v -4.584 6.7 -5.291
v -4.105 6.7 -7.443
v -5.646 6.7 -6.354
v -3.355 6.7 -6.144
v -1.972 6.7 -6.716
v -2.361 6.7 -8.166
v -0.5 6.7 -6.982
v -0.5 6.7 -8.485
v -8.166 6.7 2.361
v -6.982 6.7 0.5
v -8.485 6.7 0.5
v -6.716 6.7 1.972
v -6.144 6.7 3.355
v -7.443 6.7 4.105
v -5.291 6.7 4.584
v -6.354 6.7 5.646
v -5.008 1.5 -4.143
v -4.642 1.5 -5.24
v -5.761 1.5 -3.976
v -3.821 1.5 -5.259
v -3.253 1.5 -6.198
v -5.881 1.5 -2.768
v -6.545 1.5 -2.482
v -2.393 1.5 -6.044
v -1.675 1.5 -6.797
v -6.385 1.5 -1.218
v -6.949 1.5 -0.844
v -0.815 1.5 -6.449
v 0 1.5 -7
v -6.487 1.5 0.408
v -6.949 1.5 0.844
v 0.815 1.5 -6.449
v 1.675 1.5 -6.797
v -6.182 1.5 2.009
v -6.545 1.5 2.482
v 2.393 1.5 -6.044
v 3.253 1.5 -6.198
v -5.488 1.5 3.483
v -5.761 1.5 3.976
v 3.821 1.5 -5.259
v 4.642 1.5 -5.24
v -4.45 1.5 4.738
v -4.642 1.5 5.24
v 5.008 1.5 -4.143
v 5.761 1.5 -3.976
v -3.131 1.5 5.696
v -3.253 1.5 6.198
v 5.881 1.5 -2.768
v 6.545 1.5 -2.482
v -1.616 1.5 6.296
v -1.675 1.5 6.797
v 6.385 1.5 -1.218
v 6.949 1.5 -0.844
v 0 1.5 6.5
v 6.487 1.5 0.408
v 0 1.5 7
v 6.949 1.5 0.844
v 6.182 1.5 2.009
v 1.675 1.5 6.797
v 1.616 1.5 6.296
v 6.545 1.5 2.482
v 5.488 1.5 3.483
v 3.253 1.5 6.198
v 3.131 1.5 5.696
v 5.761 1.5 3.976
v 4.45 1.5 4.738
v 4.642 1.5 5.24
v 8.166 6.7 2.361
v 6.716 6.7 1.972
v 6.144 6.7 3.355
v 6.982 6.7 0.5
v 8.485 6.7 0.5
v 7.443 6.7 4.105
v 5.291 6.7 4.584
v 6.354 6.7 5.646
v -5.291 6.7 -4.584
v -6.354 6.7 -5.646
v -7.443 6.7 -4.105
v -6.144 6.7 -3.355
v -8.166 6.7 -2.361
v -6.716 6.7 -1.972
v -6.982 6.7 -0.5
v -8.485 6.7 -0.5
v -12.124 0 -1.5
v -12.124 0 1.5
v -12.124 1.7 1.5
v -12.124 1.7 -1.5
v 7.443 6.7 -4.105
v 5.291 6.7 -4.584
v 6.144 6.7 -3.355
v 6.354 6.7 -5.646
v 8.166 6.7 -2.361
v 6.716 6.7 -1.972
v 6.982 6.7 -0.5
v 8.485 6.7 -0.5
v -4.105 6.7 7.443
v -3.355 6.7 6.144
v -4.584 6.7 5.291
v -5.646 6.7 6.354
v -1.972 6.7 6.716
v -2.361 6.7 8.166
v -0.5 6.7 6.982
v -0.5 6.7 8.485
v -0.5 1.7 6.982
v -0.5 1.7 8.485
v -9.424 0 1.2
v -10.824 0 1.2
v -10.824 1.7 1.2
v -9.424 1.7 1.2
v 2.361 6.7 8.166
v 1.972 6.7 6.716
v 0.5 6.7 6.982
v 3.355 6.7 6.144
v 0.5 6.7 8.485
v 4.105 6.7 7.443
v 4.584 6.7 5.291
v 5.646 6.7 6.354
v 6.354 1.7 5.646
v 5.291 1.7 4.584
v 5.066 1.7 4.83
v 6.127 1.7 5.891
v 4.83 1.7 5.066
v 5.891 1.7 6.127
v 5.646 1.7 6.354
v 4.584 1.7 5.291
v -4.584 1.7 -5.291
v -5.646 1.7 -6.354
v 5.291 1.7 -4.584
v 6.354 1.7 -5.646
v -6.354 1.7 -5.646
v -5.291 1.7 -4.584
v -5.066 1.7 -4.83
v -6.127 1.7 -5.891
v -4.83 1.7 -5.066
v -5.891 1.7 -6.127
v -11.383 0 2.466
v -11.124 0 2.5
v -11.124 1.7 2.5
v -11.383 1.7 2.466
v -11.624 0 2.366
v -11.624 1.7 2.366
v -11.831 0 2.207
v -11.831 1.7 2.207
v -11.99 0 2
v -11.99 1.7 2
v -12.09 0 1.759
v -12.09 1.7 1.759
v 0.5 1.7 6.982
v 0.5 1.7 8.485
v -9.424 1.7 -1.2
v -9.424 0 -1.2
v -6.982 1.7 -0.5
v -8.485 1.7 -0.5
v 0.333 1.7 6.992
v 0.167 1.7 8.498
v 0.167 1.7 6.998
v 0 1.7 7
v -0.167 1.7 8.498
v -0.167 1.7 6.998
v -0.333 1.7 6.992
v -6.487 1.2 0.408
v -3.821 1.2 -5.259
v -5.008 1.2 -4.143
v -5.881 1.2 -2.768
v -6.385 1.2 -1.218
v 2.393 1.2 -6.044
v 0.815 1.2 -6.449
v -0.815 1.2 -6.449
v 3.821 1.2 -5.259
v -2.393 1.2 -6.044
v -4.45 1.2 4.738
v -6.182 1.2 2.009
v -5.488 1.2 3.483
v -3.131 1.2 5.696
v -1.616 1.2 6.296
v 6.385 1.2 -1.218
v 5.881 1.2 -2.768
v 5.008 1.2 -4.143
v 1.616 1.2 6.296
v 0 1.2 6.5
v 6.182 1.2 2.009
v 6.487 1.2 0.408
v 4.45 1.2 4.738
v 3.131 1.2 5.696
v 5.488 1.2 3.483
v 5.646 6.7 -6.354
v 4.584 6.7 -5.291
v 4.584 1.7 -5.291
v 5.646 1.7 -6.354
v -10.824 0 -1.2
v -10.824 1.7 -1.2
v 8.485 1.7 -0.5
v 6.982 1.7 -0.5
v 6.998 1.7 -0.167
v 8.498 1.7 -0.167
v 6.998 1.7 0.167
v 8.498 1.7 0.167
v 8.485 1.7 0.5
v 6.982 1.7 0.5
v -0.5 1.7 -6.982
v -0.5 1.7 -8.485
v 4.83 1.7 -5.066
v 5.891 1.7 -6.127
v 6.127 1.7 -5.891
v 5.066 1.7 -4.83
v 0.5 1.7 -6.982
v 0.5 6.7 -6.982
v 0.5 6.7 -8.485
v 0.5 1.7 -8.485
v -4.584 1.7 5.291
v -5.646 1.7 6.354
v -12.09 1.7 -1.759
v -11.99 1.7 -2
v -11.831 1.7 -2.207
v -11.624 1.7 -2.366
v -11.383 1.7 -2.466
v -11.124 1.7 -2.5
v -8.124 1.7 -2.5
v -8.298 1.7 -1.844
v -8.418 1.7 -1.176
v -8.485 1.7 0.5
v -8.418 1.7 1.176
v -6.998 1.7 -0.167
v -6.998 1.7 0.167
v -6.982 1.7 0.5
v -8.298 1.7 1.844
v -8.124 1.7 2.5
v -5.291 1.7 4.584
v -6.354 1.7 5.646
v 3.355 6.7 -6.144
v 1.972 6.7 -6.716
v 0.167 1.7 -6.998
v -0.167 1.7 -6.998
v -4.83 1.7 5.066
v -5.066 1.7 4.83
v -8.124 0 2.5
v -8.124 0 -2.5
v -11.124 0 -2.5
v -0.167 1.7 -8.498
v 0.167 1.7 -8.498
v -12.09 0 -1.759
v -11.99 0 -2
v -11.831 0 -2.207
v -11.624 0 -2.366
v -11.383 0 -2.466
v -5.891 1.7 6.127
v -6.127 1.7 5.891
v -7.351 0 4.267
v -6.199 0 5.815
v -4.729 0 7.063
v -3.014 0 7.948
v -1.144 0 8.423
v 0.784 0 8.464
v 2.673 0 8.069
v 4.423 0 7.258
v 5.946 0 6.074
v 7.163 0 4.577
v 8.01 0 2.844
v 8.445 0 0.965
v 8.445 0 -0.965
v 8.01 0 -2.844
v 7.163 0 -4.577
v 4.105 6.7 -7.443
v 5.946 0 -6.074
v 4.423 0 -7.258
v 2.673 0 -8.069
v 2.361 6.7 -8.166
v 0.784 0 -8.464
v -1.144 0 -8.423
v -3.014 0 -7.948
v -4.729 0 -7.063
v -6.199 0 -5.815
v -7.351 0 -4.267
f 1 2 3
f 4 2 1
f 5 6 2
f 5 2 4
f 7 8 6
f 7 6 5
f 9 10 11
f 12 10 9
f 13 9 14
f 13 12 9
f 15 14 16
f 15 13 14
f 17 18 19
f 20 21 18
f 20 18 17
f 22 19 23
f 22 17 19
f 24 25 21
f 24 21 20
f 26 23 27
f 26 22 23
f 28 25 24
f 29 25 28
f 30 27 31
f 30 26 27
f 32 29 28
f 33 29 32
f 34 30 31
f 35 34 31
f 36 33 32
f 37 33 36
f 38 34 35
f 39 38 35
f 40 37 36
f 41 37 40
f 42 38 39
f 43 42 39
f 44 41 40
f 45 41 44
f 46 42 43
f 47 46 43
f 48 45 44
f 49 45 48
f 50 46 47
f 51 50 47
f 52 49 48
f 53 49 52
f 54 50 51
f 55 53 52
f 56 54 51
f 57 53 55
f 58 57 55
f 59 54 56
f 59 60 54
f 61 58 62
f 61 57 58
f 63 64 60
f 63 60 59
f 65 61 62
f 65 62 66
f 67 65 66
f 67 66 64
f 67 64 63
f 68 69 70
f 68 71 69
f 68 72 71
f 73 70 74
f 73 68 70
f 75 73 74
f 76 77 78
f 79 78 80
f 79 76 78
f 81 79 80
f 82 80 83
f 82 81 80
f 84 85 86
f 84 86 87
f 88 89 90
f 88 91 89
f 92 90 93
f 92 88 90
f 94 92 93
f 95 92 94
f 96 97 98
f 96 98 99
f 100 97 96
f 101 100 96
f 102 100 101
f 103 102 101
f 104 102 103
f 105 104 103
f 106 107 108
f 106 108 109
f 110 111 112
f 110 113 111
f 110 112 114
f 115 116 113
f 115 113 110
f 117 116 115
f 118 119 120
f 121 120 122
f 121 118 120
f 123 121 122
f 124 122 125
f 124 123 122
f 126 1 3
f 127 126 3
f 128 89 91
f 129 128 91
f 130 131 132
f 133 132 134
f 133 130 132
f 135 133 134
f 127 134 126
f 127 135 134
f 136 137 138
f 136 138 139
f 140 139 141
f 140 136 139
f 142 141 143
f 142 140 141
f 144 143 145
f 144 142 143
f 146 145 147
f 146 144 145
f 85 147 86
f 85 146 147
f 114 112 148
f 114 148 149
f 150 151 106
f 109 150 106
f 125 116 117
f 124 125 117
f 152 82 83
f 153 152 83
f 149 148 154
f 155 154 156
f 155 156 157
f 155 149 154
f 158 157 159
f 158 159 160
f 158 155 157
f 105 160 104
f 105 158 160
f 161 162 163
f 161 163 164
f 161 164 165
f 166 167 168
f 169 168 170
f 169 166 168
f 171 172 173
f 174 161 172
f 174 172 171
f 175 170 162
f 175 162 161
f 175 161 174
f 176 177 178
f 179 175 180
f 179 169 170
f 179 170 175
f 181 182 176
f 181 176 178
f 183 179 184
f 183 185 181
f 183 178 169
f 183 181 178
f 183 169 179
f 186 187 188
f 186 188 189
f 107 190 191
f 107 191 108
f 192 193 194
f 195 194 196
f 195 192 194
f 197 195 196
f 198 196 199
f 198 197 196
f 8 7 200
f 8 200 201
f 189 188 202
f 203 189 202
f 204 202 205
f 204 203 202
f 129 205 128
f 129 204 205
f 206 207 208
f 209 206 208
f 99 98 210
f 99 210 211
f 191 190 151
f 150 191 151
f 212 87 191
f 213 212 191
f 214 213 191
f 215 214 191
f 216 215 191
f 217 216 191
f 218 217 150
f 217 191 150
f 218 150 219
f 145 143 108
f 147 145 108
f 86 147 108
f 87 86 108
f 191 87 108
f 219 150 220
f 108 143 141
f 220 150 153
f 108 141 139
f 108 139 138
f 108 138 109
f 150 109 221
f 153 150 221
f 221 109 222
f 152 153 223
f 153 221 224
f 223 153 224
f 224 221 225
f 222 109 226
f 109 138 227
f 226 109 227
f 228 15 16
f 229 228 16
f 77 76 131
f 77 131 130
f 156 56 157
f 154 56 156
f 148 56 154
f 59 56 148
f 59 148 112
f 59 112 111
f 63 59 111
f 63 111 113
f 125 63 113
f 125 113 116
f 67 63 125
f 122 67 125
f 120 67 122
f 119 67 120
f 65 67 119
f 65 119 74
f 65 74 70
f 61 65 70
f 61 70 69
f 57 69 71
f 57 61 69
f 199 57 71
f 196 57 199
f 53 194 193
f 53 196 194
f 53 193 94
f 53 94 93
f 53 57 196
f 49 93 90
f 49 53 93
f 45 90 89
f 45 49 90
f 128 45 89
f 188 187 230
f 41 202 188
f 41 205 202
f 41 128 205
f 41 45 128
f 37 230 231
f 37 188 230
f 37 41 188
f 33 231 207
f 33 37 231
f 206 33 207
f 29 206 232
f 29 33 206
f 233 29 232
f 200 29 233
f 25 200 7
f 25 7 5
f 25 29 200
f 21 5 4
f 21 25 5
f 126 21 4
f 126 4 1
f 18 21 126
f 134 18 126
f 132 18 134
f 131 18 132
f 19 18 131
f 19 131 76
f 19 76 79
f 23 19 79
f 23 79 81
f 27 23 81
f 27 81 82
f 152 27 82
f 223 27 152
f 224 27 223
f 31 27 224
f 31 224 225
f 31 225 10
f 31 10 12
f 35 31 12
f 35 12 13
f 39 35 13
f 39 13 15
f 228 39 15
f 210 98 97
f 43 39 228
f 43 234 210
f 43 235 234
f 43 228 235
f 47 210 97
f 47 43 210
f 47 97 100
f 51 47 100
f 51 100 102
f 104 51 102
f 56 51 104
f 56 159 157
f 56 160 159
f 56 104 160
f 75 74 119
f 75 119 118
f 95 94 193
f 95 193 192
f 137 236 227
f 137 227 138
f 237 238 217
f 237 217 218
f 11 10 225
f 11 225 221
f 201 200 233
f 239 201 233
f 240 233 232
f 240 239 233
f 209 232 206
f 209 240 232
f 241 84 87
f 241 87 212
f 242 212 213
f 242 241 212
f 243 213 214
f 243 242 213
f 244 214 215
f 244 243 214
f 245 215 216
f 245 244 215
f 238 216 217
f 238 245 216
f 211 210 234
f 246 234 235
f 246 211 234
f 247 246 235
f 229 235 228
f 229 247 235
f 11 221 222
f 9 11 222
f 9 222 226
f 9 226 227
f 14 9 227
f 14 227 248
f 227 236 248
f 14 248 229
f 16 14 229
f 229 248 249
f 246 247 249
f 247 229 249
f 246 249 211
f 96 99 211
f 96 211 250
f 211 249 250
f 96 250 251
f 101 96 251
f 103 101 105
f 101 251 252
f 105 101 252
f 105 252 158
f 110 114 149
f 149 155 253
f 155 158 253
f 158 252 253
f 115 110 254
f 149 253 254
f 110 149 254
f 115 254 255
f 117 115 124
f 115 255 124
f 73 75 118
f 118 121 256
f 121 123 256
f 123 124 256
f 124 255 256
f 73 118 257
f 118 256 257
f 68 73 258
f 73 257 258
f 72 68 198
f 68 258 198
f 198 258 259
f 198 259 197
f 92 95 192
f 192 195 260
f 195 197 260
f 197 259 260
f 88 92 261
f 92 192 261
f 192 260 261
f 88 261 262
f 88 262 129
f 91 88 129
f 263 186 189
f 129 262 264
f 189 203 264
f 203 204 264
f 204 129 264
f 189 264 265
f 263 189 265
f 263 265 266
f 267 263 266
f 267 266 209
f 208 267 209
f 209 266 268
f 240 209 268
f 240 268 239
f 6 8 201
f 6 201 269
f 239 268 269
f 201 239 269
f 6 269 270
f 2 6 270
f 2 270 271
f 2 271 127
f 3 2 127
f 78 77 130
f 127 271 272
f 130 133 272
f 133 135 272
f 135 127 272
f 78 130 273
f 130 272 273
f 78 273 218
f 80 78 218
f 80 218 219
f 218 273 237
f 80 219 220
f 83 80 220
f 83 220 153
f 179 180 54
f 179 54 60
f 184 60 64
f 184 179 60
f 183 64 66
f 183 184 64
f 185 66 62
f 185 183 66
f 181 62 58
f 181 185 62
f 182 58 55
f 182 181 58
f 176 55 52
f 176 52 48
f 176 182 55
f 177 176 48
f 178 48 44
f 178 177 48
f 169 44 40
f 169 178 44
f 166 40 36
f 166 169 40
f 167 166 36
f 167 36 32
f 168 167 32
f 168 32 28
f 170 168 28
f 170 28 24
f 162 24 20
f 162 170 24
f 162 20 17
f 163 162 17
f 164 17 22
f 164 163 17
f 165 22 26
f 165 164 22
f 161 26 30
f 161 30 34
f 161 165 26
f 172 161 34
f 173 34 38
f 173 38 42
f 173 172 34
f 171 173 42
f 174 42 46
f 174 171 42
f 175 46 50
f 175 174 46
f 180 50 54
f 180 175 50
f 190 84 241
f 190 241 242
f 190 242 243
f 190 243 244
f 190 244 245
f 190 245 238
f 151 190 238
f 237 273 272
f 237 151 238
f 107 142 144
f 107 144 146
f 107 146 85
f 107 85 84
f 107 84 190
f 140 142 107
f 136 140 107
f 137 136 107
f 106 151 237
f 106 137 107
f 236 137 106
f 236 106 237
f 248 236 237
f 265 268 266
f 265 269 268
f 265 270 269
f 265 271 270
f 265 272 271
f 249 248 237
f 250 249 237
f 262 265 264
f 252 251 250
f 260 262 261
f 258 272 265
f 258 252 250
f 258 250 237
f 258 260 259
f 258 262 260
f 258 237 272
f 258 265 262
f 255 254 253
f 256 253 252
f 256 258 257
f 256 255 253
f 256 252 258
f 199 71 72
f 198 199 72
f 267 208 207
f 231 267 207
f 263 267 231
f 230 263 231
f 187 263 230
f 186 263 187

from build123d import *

# Parameters (mm, degrees)
SKETCH_1_R               = 8.5
EXTRUDE_1_DEPTH          = 1.2
SKETCH_2_R               = 8.5
SKETCH_2_R_2             = 7
EXTRUDE_2_DEPTH          = 5.5
SKETCH_3_R               = 7
SKETCH_3_R_2             = 6.5
EXTRUDE_3_DEPTH          = 0.3
SKETCH_4_W               = 1
SKETCH_4_H               = 4.082242853
CUT_EXTRUDE_1_DEPTH      = 5
PATTERN_CIRCULAR_1_COUNT = 8
SKETCH_5_W               = 1.4
SKETCH_5_H               = 2.4
EXTRUDE_4_DEPTH          = 1.7


with BuildPart() as part:
    # Эскиз1 → Бобышка-Вытянуть1 (new body)
    with BuildSketch(Plane(origin=(0, 0, 0), x_dir=(1, 0, 0), z_dir=(0, 1, 0))):
        with Locations(Location((0, 0, 0), (0, 0, 270))):
            Circle(SKETCH_1_R)
    extrude(amount=EXTRUDE_1_DEPTH)

    # Эскиз2 → Бобышка-Вытянуть2 (add)
    with BuildSketch(Plane(origin=(0, 1.2, 0), x_dir=(1, 0, 0), z_dir=(0, 1, 0))):
        with Locations(Location((0, 0, 0), (0, 0, 270))):
            Circle(SKETCH_2_R)
        with Locations(Location((0, 0, 0), (0, 0, 270))):
            Circle(SKETCH_2_R_2, mode=Mode.SUBTRACT)
    extrude(amount=EXTRUDE_2_DEPTH)

    # Эскиз3 → Бобышка-Вытянуть3 (add)
    with BuildSketch(Plane(origin=(0, 1.2, 0), x_dir=(1, 0, 0), z_dir=(0, 1, 0))):
        with Locations(Location((0, 0, 0), (0, 0, 270))):
            Circle(SKETCH_3_R)
        with Locations(Location((0, 0, 0), (0, 0, 270))):
            Circle(SKETCH_3_R_2, mode=Mode.SUBTRACT)
    extrude(amount=EXTRUDE_3_DEPTH)

    # Эскиз4 → Вырез-Вытянуть1 (cut)
    with BuildSketch(Plane(origin=(0, 6.7, 0), x_dir=(1, 0, 0), z_dir=(0, 1, 0))):
        with Locations((0, 7.692447021)):
            Rectangle(SKETCH_4_W, SKETCH_4_H)
    cut_extrude_1 = extrude(amount=-CUT_EXTRUDE_1_DEPTH, mode=Mode.SUBTRACT)

    # Круговой массив1: Вырез-Вытянуть1 ×8 about axis
    pattern_circular_1_axis = Axis((0, 0, 0), (0, 1, 0))
    for i in range(1, PATTERN_CIRCULAR_1_COUNT):
        add(cut_extrude_1.rotate(pattern_circular_1_axis, i * 360 / PATTERN_CIRCULAR_1_COUNT), mode=Mode.SUBTRACT)

    # Эскиз5 → Бобышка-Вытянуть4 (add)
    with BuildSketch(Plane.XZ):
        with BuildLine():
            Line((-11.124038405, -2.5), (-8.124038405, -2.5))
            ThreePointArc((-8.124038405, -2.5), (-8.5, 0), (-8.124038405, 2.5))
            Line((-8.124038405, 2.5), (-11.124038405, 2.5))
            ThreePointArc((-11.124038405, 2.5), (-11.831145186, 2.207106781), (-12.124038405, 1.5))
            Line((-12.124038405, 1.5), (-12.124038405, -1.5))
            ThreePointArc((-12.124038405, -1.5), (-11.831145186, -2.207106781), (-11.124038405, -2.5))
        make_face()
        with Locations((-10.124038405, 0)):
            Rectangle(SKETCH_5_W, SKETCH_5_H, mode=Mode.SUBTRACT)
    extrude(amount=-EXTRUDE_4_DEPTH)


solid = part.part
